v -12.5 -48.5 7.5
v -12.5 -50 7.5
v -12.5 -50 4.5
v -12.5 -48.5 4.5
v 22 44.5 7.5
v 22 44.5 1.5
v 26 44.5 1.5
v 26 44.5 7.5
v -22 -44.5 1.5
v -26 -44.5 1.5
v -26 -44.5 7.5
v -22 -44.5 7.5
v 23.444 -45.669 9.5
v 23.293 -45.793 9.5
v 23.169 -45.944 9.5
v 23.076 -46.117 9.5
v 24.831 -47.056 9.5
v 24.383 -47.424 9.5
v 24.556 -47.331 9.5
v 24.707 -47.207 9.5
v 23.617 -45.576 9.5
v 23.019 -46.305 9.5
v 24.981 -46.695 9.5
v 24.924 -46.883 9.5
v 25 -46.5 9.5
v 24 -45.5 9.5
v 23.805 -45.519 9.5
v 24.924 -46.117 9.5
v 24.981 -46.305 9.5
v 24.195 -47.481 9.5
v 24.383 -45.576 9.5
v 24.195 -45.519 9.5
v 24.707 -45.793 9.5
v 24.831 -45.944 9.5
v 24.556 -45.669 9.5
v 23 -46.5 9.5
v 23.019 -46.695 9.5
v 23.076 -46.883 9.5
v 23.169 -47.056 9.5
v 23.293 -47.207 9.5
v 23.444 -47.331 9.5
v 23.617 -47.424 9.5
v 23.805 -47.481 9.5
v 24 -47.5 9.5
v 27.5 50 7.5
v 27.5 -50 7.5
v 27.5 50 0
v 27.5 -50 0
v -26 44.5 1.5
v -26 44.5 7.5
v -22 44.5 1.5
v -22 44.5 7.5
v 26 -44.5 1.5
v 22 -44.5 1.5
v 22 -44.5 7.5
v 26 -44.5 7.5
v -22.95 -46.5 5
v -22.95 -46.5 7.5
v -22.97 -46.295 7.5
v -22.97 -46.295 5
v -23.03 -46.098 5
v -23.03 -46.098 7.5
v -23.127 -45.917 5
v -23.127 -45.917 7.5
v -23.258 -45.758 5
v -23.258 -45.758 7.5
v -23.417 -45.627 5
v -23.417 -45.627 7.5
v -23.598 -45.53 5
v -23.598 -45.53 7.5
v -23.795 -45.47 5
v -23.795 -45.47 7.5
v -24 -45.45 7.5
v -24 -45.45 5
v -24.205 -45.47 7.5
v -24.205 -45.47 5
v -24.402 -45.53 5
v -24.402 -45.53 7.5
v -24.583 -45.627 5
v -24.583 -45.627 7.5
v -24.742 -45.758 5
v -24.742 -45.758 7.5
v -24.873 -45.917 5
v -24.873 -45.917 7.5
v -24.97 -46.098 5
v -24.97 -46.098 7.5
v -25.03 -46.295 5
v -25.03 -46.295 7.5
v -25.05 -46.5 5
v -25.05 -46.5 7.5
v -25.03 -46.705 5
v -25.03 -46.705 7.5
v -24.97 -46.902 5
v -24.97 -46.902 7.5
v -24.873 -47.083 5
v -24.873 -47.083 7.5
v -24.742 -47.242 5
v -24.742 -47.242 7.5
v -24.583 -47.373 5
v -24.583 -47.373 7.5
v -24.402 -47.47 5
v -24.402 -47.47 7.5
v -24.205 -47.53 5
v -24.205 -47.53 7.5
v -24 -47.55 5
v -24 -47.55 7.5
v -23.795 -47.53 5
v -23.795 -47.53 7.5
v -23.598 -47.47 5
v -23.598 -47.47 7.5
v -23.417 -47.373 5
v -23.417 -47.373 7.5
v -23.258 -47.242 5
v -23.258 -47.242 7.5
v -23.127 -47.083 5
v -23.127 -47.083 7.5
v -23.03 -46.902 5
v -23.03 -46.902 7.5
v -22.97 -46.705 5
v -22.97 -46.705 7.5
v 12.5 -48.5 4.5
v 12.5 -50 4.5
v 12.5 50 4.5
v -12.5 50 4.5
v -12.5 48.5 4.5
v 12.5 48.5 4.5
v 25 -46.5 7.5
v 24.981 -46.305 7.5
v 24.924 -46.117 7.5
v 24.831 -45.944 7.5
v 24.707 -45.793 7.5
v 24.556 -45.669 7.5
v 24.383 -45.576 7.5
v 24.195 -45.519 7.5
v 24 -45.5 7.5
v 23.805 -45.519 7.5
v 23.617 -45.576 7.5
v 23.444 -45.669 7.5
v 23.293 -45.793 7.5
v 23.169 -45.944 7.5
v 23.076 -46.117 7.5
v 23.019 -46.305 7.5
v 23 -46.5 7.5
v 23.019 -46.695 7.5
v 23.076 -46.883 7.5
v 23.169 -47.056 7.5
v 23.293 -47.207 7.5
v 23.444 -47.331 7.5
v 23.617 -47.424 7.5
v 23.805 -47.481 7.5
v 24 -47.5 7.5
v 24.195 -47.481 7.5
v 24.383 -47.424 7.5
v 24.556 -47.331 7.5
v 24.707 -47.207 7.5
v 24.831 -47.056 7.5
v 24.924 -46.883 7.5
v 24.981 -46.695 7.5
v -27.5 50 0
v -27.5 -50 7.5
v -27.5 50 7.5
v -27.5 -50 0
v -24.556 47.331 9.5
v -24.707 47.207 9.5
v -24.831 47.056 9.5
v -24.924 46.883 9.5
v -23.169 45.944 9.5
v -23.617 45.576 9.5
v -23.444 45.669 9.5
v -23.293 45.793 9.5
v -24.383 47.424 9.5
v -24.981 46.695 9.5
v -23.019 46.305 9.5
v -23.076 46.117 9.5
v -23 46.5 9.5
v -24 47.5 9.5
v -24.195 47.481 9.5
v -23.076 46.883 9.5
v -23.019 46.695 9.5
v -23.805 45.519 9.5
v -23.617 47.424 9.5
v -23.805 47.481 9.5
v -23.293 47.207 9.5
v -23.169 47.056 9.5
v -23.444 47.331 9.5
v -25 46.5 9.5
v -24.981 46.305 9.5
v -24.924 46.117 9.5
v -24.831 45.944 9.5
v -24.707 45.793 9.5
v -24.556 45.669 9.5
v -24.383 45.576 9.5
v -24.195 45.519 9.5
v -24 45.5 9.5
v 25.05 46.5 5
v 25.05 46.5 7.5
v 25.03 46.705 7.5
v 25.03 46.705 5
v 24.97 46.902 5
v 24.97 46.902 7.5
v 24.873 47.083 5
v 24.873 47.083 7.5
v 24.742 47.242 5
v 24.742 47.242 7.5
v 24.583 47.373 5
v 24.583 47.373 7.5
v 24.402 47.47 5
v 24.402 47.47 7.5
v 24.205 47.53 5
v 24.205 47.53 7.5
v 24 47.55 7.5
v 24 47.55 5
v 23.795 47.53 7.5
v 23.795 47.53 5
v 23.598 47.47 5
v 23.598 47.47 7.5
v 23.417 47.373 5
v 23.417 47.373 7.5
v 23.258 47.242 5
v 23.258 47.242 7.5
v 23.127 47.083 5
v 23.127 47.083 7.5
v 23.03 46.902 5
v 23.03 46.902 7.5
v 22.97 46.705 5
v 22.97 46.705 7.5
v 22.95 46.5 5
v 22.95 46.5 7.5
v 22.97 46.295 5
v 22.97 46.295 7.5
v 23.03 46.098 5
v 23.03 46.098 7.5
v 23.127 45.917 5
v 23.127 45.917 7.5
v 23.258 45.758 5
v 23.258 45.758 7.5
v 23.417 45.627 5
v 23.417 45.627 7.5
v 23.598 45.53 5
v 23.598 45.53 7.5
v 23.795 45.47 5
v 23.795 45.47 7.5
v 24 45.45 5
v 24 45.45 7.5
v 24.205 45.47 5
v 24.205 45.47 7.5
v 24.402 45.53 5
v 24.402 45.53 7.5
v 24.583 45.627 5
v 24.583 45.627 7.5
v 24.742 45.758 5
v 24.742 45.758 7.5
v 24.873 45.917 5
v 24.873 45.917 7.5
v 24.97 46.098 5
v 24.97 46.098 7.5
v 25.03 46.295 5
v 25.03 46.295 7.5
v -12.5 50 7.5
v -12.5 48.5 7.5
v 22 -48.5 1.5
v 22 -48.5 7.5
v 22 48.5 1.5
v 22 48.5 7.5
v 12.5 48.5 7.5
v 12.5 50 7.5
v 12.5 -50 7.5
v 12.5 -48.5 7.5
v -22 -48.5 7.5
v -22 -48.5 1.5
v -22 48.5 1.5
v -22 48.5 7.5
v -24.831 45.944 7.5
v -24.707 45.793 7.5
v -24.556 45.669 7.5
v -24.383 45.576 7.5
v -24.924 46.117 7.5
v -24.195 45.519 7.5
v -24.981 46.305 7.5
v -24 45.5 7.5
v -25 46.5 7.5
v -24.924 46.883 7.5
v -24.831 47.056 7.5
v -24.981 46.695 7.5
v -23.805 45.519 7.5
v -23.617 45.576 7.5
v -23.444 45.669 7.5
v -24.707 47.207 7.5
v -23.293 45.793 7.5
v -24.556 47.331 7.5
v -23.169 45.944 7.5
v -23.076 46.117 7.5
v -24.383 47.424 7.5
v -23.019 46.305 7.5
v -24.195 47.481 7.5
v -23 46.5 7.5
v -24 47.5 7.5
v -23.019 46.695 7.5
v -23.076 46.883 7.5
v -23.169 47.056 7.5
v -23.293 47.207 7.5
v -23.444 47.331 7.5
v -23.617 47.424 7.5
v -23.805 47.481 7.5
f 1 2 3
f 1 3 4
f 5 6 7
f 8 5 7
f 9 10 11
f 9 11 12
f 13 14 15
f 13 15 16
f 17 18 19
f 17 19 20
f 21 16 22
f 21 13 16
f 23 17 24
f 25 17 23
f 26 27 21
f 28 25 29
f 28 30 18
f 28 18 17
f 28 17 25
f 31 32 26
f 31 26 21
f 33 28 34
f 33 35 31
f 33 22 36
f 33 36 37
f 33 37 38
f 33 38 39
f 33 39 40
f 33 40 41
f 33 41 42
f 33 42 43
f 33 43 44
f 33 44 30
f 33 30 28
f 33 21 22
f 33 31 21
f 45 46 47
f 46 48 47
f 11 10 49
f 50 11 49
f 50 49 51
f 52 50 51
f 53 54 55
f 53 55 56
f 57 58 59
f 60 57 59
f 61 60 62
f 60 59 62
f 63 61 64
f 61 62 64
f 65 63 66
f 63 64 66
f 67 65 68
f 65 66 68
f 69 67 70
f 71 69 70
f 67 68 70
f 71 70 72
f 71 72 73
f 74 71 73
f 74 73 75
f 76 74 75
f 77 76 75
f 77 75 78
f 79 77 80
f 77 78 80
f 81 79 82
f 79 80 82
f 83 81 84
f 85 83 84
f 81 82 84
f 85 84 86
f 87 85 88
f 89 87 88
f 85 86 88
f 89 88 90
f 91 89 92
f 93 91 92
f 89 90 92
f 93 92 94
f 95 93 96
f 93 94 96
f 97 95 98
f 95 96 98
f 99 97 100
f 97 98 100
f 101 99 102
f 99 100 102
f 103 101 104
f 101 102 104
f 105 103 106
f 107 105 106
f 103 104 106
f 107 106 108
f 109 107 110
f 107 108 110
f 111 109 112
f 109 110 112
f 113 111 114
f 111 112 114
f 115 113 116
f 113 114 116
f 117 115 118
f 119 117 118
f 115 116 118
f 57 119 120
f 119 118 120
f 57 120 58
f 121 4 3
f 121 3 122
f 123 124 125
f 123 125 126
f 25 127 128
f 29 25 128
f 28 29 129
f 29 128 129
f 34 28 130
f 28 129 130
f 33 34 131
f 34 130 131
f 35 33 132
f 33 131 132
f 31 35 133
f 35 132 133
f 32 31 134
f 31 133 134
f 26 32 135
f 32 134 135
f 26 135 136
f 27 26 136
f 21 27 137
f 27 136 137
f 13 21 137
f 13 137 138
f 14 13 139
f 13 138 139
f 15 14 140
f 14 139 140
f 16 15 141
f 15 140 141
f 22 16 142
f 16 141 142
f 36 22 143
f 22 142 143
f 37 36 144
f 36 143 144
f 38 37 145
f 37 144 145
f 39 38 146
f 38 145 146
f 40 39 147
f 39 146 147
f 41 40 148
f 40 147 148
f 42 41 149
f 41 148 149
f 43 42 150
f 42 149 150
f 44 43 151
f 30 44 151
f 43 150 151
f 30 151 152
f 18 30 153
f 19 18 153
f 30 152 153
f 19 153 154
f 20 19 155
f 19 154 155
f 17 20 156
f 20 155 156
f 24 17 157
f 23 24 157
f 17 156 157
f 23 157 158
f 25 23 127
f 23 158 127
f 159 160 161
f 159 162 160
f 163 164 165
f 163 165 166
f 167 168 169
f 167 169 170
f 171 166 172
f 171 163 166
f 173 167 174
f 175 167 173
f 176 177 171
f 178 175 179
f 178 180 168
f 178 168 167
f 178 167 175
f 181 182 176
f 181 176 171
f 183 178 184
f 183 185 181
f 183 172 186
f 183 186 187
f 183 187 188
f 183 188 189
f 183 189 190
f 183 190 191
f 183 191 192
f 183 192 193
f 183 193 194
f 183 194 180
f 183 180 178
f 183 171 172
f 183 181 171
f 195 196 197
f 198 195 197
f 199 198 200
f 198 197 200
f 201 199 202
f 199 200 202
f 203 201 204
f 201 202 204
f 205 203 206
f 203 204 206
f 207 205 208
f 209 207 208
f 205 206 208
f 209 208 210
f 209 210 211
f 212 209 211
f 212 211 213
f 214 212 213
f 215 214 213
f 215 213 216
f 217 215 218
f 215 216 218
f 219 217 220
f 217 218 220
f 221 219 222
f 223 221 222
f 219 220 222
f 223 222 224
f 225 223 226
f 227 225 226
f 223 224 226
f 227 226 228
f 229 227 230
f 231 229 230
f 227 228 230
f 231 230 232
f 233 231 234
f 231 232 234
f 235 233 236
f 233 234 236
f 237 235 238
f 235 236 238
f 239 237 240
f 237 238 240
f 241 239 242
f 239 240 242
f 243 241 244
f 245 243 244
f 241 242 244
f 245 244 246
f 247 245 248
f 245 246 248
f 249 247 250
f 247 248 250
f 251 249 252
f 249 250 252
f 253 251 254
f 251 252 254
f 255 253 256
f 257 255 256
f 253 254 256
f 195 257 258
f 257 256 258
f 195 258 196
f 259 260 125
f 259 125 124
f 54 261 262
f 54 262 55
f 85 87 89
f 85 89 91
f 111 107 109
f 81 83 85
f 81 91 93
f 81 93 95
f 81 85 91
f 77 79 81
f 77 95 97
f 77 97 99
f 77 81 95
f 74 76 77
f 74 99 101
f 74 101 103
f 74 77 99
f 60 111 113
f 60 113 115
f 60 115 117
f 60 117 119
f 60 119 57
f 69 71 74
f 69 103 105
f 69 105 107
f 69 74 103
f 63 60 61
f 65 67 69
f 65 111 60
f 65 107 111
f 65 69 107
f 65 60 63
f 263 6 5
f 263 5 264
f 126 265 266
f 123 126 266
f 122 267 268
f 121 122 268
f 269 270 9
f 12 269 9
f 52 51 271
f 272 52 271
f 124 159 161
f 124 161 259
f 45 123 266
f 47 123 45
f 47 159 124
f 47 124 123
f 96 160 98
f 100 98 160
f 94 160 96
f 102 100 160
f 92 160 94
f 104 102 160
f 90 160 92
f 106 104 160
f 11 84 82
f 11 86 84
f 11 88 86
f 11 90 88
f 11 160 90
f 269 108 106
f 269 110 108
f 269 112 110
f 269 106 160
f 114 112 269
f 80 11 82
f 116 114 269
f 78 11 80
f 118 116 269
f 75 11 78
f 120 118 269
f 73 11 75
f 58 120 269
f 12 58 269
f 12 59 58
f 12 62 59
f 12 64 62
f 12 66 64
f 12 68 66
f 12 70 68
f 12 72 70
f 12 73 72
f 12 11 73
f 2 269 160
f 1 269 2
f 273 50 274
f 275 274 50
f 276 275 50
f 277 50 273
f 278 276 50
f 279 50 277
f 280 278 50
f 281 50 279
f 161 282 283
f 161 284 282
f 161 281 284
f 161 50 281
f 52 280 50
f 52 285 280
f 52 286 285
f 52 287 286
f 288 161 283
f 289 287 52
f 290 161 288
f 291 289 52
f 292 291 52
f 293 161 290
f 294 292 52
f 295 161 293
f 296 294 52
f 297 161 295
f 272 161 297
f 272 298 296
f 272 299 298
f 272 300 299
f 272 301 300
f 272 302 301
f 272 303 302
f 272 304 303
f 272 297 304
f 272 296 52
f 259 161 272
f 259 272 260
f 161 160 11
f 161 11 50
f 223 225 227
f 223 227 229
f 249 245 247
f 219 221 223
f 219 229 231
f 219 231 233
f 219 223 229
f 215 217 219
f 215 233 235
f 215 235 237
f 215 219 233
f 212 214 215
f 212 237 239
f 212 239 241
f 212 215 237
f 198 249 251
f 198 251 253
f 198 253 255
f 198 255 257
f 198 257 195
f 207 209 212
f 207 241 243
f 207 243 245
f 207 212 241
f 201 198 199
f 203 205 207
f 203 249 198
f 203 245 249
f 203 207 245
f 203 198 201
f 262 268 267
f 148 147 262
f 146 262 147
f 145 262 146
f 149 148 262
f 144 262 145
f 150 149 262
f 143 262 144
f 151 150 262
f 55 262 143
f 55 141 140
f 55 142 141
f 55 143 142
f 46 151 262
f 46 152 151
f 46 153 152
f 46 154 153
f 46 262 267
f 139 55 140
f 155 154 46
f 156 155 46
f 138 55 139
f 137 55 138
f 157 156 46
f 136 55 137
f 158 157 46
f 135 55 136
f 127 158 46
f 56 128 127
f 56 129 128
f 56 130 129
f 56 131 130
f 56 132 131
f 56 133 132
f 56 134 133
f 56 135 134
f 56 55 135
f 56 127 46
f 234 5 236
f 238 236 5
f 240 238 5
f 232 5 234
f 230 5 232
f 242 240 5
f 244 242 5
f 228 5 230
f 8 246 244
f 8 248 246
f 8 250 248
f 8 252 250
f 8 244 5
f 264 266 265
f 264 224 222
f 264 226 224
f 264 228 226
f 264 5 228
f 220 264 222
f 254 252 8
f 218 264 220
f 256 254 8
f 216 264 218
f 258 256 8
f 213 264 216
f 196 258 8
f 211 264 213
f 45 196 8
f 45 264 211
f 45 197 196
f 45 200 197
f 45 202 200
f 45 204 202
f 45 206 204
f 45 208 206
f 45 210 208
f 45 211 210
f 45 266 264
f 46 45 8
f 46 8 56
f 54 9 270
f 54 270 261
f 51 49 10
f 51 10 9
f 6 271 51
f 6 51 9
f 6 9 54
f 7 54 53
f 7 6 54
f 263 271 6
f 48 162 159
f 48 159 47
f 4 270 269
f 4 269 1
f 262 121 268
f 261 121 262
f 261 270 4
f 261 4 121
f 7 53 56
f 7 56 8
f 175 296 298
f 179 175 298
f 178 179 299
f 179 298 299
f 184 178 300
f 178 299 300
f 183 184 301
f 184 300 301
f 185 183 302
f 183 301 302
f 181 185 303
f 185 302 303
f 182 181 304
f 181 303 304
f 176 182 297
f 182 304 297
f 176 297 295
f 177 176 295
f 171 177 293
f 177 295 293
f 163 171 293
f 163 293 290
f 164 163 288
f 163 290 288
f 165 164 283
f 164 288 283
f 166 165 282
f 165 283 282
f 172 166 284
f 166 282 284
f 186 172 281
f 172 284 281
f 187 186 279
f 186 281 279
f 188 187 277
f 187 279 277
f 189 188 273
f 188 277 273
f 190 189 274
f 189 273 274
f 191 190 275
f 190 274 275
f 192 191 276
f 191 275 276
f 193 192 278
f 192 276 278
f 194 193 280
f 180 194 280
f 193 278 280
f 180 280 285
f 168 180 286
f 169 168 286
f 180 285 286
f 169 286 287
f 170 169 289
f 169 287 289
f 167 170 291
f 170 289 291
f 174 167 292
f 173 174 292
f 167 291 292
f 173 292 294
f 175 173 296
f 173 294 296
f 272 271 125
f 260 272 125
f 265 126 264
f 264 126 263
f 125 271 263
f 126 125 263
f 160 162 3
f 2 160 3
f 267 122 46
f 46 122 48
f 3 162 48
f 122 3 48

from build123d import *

# Parameters (mm, degrees)
SKETCH_W        = 55
SKETCH_H        = 100
PAD_DEPTH       = 1.5
SKETCH001_W     = 55
SKETCH001_H     = 100
SKETCH001_W_2   = 52
SKETCH001_H_2   = 97
PAD001_DEPTH    = 6
SKETCH002_W     = 25
SKETCH002_H     = 1.5
POCKET_DEPTH    = 3
SKETCH003_W     = 4
SKETCH003_H     = 4
PAD002_DEPTH    = 6
SKETCH004_R     = 1
PAD003_DEPTH    = 2
SKETCH005_R     = 1
PAD004_DEPTH    = 2
SKETCH006_R     = 1.05
POCKET001_DEPTH = 2.5
SKETCH007_R     = 1.05
POCKET002_DEPTH = 2.5


with BuildPart() as part:
    # Sketch → Pad (new body)
    with BuildSketch(Plane.XY):
        Rectangle(SKETCH_W, SKETCH_H)
    extrude(amount=PAD_DEPTH)

    # Sketch001 (on Face6 of Pad) → Pad001 (join)
    with BuildSketch(Plane.XY.offset(1.5)):
        Rectangle(SKETCH001_W, SKETCH001_H)
        Rectangle(SKETCH001_W_2, SKETCH001_H_2, mode=Mode.SUBTRACT)
    extrude(amount=PAD001_DEPTH)

    # Sketch002 (on Face9 of Pad001) → Pocket (cut)
    with BuildSketch(Plane.XY.offset(7.5)):
        with Locations((0, 49.25)):
            Rectangle(SKETCH002_W, SKETCH002_H)
        with Locations((0, -49.25)):
            Rectangle(SKETCH002_W, SKETCH002_H)
    extrude(amount=-POCKET_DEPTH, mode=Mode.SUBTRACT)

    # Sketch003 (on Face22 of Pocket) → Pad002 (join)
    with BuildSketch(Plane.XY.offset(1.5)):
        with Locations((-24, -46.5)):
            Rectangle(SKETCH003_W, SKETCH003_H)
        with Locations((24, -46.5)):
            Rectangle(SKETCH003_W, SKETCH003_H)
        with Locations((24, 46.5)):
            Rectangle(SKETCH003_W, SKETCH003_H)
        with Locations((-24, 46.5)):
            Rectangle(SKETCH003_W, SKETCH003_H)
    extrude(amount=PAD002_DEPTH)

    # Sketch004 (on Face21 of Pad002) → Pad003 (join)
    with BuildSketch(Plane.XY.offset(7.5)):
        with Locations((-24, 46.5)):
            Circle(SKETCH004_R)
    extrude(amount=PAD003_DEPTH)

    # Sketch005 (on Face16 of Pad003) → Pad004 (join)
    with BuildSketch(Plane.XY.offset(7.5)):
        with Locations((24, -46.5)):
            Circle(SKETCH005_R)
    extrude(amount=PAD004_DEPTH)

    # Sketch006 (on Face18 of Pad004) → Pocket001 (cut)
    with BuildSketch(Plane.XY.offset(7.5)):
        with Locations((24, 46.5)):
            Circle(SKETCH006_R)
    extrude(amount=-POCKET001_DEPTH, mode=Mode.SUBTRACT)

    # Sketch007 (on Face22 of Pocket001) → Pocket002 (cut)
    with BuildSketch(Plane.XY.offset(7.5)):
        with Locations((-24, -46.5)):
            Circle(SKETCH007_R)
    extrude(amount=-POCKET002_DEPTH, mode=Mode.SUBTRACT)


solid = part.part
